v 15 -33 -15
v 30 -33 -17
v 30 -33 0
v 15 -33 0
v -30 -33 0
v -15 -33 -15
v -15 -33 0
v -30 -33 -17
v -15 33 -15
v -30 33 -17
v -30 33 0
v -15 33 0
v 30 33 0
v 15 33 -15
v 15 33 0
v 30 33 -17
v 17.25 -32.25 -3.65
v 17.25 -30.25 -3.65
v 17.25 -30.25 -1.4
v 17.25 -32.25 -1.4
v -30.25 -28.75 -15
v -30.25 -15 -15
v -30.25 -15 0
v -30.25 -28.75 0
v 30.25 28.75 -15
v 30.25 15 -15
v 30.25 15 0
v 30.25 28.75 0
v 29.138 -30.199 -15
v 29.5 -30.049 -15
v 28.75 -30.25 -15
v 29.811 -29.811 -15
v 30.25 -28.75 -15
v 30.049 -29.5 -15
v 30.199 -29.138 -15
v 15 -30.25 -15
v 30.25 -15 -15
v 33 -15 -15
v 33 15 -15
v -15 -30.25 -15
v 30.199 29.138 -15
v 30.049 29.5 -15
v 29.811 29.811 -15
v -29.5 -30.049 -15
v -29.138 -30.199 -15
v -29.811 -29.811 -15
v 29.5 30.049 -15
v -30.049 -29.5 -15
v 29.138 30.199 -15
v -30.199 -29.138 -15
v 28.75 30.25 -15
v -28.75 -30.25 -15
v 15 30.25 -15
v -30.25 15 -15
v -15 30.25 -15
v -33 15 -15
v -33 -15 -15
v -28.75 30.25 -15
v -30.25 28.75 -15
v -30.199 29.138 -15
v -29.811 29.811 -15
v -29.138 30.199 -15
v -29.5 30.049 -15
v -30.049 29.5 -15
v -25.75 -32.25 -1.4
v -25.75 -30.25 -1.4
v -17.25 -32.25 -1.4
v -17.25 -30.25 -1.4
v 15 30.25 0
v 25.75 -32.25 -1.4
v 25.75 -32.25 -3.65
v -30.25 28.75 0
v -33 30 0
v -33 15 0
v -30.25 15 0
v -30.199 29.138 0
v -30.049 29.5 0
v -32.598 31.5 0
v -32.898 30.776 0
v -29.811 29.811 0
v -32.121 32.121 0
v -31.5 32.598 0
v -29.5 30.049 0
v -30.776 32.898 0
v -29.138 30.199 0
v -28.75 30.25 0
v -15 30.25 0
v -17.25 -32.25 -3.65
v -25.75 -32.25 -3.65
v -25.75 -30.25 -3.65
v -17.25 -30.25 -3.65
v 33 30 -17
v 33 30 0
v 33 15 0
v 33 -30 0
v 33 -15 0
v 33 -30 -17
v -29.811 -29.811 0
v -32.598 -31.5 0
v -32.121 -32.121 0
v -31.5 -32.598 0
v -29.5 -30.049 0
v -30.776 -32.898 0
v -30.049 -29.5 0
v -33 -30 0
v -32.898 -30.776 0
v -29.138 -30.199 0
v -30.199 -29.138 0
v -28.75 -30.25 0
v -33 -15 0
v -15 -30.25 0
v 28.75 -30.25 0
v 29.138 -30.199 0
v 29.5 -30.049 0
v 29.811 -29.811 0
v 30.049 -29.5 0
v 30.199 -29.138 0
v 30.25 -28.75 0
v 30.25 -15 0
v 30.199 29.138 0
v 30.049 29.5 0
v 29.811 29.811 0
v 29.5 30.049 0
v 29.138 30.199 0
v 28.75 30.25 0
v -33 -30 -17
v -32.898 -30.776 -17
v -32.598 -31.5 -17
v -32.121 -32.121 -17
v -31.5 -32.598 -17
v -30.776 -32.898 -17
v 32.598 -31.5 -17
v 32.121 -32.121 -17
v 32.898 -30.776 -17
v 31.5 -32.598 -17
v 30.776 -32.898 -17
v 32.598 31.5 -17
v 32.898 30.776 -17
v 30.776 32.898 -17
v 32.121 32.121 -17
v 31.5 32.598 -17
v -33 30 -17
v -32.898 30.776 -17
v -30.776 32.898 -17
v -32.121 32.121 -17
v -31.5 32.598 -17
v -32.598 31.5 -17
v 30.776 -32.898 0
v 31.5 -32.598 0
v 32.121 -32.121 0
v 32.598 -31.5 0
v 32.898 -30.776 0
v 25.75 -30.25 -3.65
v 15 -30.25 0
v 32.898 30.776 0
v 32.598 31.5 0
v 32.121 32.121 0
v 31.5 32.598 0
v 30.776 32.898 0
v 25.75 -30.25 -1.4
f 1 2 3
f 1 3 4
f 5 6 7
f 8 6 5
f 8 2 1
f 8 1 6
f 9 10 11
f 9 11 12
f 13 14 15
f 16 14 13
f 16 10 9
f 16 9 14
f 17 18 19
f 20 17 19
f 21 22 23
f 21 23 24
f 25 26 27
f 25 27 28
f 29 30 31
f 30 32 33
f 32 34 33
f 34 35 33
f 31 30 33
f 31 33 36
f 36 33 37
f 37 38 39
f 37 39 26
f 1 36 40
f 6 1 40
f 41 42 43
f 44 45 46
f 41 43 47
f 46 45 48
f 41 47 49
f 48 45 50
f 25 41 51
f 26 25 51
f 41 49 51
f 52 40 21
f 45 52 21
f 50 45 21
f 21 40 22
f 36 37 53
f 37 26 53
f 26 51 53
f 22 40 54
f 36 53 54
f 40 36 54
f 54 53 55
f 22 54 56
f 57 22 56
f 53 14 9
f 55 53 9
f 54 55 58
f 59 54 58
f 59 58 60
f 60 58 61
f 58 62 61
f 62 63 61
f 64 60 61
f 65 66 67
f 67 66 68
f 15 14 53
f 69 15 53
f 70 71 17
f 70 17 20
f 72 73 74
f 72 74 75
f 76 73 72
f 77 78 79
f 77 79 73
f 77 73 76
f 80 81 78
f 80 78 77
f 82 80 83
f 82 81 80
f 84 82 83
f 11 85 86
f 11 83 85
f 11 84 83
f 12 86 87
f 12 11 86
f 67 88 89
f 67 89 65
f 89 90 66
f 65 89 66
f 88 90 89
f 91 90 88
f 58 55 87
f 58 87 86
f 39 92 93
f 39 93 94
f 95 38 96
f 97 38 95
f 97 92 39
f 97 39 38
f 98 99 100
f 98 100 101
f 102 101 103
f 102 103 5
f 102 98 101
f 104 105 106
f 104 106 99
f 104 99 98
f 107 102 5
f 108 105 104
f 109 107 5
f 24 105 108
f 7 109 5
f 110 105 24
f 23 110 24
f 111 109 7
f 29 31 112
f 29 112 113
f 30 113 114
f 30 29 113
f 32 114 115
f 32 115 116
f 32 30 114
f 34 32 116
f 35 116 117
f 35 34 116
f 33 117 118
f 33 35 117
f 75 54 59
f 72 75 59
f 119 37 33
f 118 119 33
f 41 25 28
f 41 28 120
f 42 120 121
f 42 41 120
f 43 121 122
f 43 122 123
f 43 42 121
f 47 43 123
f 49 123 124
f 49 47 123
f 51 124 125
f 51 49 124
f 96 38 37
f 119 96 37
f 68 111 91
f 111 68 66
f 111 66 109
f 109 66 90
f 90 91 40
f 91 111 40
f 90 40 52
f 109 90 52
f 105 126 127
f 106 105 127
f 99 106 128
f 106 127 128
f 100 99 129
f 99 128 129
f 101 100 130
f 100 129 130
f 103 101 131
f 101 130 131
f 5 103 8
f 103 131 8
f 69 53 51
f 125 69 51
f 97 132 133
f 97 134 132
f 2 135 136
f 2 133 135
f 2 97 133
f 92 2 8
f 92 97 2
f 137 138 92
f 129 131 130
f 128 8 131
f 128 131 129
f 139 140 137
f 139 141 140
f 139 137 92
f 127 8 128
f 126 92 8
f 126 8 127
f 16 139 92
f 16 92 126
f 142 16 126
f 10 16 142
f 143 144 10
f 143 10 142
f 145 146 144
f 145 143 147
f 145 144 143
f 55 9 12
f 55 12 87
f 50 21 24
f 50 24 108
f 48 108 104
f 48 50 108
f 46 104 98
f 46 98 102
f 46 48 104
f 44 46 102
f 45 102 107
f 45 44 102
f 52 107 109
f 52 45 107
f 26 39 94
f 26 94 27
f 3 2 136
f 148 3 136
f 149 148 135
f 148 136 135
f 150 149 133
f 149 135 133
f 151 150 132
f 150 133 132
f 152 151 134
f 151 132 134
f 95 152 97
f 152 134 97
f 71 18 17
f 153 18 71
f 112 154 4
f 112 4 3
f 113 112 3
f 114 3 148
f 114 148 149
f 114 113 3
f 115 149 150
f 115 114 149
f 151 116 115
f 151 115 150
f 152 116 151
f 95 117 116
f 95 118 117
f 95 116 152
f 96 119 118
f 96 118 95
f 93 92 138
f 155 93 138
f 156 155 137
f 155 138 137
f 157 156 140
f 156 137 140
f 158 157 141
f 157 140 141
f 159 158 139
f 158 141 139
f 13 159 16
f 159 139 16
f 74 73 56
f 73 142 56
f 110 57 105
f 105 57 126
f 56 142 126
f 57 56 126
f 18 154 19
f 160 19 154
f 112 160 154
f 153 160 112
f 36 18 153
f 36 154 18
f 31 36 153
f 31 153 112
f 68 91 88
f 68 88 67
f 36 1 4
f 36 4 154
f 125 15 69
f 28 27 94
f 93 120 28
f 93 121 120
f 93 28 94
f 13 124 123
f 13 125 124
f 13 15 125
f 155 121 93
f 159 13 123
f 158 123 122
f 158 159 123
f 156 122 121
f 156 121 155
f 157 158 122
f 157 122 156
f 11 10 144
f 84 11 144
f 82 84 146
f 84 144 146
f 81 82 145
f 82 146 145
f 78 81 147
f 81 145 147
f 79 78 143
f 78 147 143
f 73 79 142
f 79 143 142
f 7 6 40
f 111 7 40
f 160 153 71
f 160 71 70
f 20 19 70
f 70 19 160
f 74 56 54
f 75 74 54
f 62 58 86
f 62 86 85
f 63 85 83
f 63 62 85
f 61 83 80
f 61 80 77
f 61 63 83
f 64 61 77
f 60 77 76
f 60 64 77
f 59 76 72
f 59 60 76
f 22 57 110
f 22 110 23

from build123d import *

# Parameters (mm, degrees)
PAD001_DEPTH = 2
PAD002_DEPTH = 15
SKETCH003_W  = 2.25
SKETCH003_H  = 8.5
POCKET_DEPTH = 2


with BuildPart() as part:
    # Sketch001 → Pad001 (new body)
    with BuildSketch(Plane.XY):
        with BuildLine():
            Line((-30, 33), (30, 33))
            ThreePointArc((33, 30), (32.12132, 32.12132), (30, 33))
            Line((33, 30), (33, -30))
            ThreePointArc((30, -33), (32.12132, -32.12132), (33, -30))
            Line((30, -33), (-30, -33))
            ThreePointArc((-33, -30), (-32.12132, -32.12132), (-30, -33))
            Line((-33, -30), (-33, 30))
            ThreePointArc((-30, 33), (-32.12132, 32.12132), (-33, 30))
        make_face()
    extrude(amount=PAD001_DEPTH)

    # Sketch002 (on Face10 of Pad001) → Pad002 (join)
    with BuildSketch(Plane.XY.offset(2)):
        with BuildLine():
            ThreePointArc((-30, 33), (-32.12132, 32.12132), (-33, 30))
            Line((-33, 30), (-33, 15))
            Line((-33, 15), (-30.25, 15))
            Line((-30.25, 15), (-30.25, 28.75))
            ThreePointArc((-28.75, 30.25), (-29.81066, 29.81066), (-30.25, 28.75))
            Line((-15, 30.25), (-28.75, 30.25))
            Line((-15, 33), (-15, 30.25))
            Line((-30, 33), (-15, 33))
        make_face()
        with BuildLine():
            ThreePointArc((33, 30), (32.12132, 32.12132), (30, 33))
            Line((30, 33), (15, 33))
            Line((15, 33), (15, 30.25))
            Line((15, 30.25), (28.75, 30.25))
            ThreePointArc((30.25, 28.75), (29.81066, 29.81066), (28.75, 30.25))
            Line((30.25, 15), (30.25, 28.75))
            Line((33, 15), (30.25, 15))
            Line((33, 30), (33, 15))
        make_face()
        with BuildLine():
            ThreePointArc((-33, -30), (-32.12132, -32.12132), (-30, -33))
            Line((-30, -33), (-15, -33))
            Line((-15, -33), (-15, -30.25))
            Line((-15, -30.25), (-28.75, -30.25))
            ThreePointArc((-30.25, -28.75), (-29.81066, -29.81066), (-28.75, -30.25))
            Line((-30.25, -15), (-30.25, -28.75))
            Line((-33, -15), (-30.25, -15))
            Line((-33, -30), (-33, -15))
        make_face()
        with BuildLine():
            ThreePointArc((30, -33), (32.12132, -32.12132), (33, -30))
            Line((33, -30), (33, -15))
            Line((33, -15), (30.25, -15))
            Line((30.25, -15), (30.25, -28.75))
            ThreePointArc((28.75, -30.25), (29.81066, -29.81066), (30.25, -28.75))
            Line((15, -30.25), (28.75, -30.25))
            Line((15, -33), (15, -30.25))
            Line((30, -33), (15, -33))
        make_face()
    extrude(amount=PAD002_DEPTH)

    # Sketch003 (on DatumPlane) → Pocket (cut)
    with BuildSketch(Plane(origin=(0, -30.25, 9.5), x_dir=(0, 0, 1), z_dir=(0, 1, 0))):
        with Locations((4.975, -21.5)):
            Rectangle(SKETCH003_W, SKETCH003_H)
        with Locations((4.975, 21.5)):
            Rectangle(SKETCH003_W, SKETCH003_H)
    extrude(amount=-POCKET_DEPTH, mode=Mode.SUBTRACT)


with BuildPart() as part_1:
    # Body001 placement: moved
    add(part.part.moved(Location((0, 0, -17))))


solid = part_1.part
